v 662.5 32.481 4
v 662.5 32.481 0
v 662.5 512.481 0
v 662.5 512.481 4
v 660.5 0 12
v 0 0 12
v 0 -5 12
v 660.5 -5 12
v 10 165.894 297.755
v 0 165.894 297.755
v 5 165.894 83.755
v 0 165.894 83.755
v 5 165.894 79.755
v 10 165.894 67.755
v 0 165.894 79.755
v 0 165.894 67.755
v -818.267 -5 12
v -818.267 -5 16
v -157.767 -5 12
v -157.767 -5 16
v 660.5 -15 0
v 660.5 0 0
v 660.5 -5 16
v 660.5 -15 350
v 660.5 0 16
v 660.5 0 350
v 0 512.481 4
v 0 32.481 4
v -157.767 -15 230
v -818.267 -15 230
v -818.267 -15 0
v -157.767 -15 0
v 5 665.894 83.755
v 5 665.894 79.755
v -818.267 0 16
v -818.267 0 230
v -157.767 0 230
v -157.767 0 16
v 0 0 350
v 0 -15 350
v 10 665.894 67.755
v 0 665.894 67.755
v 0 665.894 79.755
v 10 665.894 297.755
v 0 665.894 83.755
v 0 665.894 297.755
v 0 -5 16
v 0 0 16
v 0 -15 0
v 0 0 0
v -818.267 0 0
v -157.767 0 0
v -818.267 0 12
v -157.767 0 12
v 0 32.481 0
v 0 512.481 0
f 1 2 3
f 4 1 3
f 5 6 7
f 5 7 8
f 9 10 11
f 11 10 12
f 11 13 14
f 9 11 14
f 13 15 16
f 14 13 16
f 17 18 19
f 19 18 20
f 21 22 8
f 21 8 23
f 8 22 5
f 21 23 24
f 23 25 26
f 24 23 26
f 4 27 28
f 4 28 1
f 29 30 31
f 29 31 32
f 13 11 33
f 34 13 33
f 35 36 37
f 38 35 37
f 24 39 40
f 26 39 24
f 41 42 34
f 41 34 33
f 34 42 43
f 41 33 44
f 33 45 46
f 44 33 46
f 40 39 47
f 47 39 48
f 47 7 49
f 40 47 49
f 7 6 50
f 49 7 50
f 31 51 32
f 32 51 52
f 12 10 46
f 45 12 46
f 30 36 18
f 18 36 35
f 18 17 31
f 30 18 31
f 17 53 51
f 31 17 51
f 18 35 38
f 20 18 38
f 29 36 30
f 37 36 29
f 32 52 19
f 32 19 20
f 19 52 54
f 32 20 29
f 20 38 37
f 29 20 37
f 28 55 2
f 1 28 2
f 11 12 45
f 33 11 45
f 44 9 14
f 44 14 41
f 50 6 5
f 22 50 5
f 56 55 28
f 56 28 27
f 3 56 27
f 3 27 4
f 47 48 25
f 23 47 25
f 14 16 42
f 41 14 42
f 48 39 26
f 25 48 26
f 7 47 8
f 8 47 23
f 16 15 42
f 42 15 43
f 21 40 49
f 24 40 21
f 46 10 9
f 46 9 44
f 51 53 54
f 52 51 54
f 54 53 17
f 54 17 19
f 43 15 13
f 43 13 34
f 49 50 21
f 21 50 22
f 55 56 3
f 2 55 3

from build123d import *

# Parameters (mm, degrees)
F0_W      = 660.5
F0_H      = 12
F0_H_2    = 4
F0_H_3    = 334
F1_DEPTH  = 15
F2_W      = 662.5
F2_H      = 480
F3_DEPTH  = 4
F4_DEPTH  = 5
F5_W      = 660.5
F5_H      = 214
F5_H_2    = 4
F5_H_3    = 12
F6_DEPTH  = 15
F7_DEPTH  = 5
F8_W      = 500
F8_H      = 214
F8_H_2    = 4
F8_H_3    = 12
F9_DEPTH  = 10
F10_DEPTH = 5


with BuildPart() as f1:
    # F0 (on Front) → F1 (new body)
    with BuildSketch(Plane.XZ):
        with Locations((330.25, 6)):
            Rectangle(F0_W, F0_H)
        with Locations((330.25, 14)):
            Rectangle(F0_W, F0_H_2)
        with Locations((330.25, 183)):
            Rectangle(F0_W, F0_H_3)
    extrude(amount=F1_DEPTH)

    # F0 (on Front) → F4 (cut)
    with BuildSketch(Plane.XZ):
        with Locations((330.25, 14)):
            Rectangle(F0_W, F0_H_2)
    extrude(amount=F4_DEPTH, mode=Mode.SUBTRACT)


with BuildPart() as f3:
    # F2 (on Top) → F3 (new body)
    with BuildSketch(Plane.XY):
        with Locations((331.25, 272.481477)):
            Rectangle(F2_W, F2_H)
    extrude(amount=F3_DEPTH)


with BuildPart() as f6:
    # F5 (on Front) → F6 (new body)
    with BuildSketch(Plane.XZ):
        with Locations((-488.017345, 123)):
            Rectangle(F5_W, F5_H)
        with Locations((-488.017345, 14)):
            Rectangle(F5_W, F5_H_2)
        with Locations((-488.017345, 6)):
            Rectangle(F5_W, F5_H_3)
    extrude(amount=F6_DEPTH)

    # F5 (on Front) → F7 (cut)
    with BuildSketch(Plane.XZ):
        with Locations((-488.017345, 14)):
            Rectangle(F5_W, F5_H_2)
    extrude(amount=F7_DEPTH, mode=Mode.SUBTRACT)


with BuildPart() as f9:
    # F8 (on Right) → F9 (new body)
    with BuildSketch(Plane.YZ):
        with Locations((415.894054, 190.754717)):
            Rectangle(F8_W, F8_H)
        with Locations((415.894054, 81.754717)):
            Rectangle(F8_W, F8_H_2)
        with Locations((415.894054, 73.754717)):
            Rectangle(F8_W, F8_H_3)
    extrude(amount=F9_DEPTH)

    # F8 (on Right) → F10 (cut)
    with BuildSketch(Plane.YZ):
        with Locations((415.894054, 81.754717)):
            Rectangle(F8_W, F8_H_2)
    extrude(amount=F10_DEPTH, mode=Mode.SUBTRACT)


solid = Compound([f1.part, f3.part, f6.part, f9.part])
